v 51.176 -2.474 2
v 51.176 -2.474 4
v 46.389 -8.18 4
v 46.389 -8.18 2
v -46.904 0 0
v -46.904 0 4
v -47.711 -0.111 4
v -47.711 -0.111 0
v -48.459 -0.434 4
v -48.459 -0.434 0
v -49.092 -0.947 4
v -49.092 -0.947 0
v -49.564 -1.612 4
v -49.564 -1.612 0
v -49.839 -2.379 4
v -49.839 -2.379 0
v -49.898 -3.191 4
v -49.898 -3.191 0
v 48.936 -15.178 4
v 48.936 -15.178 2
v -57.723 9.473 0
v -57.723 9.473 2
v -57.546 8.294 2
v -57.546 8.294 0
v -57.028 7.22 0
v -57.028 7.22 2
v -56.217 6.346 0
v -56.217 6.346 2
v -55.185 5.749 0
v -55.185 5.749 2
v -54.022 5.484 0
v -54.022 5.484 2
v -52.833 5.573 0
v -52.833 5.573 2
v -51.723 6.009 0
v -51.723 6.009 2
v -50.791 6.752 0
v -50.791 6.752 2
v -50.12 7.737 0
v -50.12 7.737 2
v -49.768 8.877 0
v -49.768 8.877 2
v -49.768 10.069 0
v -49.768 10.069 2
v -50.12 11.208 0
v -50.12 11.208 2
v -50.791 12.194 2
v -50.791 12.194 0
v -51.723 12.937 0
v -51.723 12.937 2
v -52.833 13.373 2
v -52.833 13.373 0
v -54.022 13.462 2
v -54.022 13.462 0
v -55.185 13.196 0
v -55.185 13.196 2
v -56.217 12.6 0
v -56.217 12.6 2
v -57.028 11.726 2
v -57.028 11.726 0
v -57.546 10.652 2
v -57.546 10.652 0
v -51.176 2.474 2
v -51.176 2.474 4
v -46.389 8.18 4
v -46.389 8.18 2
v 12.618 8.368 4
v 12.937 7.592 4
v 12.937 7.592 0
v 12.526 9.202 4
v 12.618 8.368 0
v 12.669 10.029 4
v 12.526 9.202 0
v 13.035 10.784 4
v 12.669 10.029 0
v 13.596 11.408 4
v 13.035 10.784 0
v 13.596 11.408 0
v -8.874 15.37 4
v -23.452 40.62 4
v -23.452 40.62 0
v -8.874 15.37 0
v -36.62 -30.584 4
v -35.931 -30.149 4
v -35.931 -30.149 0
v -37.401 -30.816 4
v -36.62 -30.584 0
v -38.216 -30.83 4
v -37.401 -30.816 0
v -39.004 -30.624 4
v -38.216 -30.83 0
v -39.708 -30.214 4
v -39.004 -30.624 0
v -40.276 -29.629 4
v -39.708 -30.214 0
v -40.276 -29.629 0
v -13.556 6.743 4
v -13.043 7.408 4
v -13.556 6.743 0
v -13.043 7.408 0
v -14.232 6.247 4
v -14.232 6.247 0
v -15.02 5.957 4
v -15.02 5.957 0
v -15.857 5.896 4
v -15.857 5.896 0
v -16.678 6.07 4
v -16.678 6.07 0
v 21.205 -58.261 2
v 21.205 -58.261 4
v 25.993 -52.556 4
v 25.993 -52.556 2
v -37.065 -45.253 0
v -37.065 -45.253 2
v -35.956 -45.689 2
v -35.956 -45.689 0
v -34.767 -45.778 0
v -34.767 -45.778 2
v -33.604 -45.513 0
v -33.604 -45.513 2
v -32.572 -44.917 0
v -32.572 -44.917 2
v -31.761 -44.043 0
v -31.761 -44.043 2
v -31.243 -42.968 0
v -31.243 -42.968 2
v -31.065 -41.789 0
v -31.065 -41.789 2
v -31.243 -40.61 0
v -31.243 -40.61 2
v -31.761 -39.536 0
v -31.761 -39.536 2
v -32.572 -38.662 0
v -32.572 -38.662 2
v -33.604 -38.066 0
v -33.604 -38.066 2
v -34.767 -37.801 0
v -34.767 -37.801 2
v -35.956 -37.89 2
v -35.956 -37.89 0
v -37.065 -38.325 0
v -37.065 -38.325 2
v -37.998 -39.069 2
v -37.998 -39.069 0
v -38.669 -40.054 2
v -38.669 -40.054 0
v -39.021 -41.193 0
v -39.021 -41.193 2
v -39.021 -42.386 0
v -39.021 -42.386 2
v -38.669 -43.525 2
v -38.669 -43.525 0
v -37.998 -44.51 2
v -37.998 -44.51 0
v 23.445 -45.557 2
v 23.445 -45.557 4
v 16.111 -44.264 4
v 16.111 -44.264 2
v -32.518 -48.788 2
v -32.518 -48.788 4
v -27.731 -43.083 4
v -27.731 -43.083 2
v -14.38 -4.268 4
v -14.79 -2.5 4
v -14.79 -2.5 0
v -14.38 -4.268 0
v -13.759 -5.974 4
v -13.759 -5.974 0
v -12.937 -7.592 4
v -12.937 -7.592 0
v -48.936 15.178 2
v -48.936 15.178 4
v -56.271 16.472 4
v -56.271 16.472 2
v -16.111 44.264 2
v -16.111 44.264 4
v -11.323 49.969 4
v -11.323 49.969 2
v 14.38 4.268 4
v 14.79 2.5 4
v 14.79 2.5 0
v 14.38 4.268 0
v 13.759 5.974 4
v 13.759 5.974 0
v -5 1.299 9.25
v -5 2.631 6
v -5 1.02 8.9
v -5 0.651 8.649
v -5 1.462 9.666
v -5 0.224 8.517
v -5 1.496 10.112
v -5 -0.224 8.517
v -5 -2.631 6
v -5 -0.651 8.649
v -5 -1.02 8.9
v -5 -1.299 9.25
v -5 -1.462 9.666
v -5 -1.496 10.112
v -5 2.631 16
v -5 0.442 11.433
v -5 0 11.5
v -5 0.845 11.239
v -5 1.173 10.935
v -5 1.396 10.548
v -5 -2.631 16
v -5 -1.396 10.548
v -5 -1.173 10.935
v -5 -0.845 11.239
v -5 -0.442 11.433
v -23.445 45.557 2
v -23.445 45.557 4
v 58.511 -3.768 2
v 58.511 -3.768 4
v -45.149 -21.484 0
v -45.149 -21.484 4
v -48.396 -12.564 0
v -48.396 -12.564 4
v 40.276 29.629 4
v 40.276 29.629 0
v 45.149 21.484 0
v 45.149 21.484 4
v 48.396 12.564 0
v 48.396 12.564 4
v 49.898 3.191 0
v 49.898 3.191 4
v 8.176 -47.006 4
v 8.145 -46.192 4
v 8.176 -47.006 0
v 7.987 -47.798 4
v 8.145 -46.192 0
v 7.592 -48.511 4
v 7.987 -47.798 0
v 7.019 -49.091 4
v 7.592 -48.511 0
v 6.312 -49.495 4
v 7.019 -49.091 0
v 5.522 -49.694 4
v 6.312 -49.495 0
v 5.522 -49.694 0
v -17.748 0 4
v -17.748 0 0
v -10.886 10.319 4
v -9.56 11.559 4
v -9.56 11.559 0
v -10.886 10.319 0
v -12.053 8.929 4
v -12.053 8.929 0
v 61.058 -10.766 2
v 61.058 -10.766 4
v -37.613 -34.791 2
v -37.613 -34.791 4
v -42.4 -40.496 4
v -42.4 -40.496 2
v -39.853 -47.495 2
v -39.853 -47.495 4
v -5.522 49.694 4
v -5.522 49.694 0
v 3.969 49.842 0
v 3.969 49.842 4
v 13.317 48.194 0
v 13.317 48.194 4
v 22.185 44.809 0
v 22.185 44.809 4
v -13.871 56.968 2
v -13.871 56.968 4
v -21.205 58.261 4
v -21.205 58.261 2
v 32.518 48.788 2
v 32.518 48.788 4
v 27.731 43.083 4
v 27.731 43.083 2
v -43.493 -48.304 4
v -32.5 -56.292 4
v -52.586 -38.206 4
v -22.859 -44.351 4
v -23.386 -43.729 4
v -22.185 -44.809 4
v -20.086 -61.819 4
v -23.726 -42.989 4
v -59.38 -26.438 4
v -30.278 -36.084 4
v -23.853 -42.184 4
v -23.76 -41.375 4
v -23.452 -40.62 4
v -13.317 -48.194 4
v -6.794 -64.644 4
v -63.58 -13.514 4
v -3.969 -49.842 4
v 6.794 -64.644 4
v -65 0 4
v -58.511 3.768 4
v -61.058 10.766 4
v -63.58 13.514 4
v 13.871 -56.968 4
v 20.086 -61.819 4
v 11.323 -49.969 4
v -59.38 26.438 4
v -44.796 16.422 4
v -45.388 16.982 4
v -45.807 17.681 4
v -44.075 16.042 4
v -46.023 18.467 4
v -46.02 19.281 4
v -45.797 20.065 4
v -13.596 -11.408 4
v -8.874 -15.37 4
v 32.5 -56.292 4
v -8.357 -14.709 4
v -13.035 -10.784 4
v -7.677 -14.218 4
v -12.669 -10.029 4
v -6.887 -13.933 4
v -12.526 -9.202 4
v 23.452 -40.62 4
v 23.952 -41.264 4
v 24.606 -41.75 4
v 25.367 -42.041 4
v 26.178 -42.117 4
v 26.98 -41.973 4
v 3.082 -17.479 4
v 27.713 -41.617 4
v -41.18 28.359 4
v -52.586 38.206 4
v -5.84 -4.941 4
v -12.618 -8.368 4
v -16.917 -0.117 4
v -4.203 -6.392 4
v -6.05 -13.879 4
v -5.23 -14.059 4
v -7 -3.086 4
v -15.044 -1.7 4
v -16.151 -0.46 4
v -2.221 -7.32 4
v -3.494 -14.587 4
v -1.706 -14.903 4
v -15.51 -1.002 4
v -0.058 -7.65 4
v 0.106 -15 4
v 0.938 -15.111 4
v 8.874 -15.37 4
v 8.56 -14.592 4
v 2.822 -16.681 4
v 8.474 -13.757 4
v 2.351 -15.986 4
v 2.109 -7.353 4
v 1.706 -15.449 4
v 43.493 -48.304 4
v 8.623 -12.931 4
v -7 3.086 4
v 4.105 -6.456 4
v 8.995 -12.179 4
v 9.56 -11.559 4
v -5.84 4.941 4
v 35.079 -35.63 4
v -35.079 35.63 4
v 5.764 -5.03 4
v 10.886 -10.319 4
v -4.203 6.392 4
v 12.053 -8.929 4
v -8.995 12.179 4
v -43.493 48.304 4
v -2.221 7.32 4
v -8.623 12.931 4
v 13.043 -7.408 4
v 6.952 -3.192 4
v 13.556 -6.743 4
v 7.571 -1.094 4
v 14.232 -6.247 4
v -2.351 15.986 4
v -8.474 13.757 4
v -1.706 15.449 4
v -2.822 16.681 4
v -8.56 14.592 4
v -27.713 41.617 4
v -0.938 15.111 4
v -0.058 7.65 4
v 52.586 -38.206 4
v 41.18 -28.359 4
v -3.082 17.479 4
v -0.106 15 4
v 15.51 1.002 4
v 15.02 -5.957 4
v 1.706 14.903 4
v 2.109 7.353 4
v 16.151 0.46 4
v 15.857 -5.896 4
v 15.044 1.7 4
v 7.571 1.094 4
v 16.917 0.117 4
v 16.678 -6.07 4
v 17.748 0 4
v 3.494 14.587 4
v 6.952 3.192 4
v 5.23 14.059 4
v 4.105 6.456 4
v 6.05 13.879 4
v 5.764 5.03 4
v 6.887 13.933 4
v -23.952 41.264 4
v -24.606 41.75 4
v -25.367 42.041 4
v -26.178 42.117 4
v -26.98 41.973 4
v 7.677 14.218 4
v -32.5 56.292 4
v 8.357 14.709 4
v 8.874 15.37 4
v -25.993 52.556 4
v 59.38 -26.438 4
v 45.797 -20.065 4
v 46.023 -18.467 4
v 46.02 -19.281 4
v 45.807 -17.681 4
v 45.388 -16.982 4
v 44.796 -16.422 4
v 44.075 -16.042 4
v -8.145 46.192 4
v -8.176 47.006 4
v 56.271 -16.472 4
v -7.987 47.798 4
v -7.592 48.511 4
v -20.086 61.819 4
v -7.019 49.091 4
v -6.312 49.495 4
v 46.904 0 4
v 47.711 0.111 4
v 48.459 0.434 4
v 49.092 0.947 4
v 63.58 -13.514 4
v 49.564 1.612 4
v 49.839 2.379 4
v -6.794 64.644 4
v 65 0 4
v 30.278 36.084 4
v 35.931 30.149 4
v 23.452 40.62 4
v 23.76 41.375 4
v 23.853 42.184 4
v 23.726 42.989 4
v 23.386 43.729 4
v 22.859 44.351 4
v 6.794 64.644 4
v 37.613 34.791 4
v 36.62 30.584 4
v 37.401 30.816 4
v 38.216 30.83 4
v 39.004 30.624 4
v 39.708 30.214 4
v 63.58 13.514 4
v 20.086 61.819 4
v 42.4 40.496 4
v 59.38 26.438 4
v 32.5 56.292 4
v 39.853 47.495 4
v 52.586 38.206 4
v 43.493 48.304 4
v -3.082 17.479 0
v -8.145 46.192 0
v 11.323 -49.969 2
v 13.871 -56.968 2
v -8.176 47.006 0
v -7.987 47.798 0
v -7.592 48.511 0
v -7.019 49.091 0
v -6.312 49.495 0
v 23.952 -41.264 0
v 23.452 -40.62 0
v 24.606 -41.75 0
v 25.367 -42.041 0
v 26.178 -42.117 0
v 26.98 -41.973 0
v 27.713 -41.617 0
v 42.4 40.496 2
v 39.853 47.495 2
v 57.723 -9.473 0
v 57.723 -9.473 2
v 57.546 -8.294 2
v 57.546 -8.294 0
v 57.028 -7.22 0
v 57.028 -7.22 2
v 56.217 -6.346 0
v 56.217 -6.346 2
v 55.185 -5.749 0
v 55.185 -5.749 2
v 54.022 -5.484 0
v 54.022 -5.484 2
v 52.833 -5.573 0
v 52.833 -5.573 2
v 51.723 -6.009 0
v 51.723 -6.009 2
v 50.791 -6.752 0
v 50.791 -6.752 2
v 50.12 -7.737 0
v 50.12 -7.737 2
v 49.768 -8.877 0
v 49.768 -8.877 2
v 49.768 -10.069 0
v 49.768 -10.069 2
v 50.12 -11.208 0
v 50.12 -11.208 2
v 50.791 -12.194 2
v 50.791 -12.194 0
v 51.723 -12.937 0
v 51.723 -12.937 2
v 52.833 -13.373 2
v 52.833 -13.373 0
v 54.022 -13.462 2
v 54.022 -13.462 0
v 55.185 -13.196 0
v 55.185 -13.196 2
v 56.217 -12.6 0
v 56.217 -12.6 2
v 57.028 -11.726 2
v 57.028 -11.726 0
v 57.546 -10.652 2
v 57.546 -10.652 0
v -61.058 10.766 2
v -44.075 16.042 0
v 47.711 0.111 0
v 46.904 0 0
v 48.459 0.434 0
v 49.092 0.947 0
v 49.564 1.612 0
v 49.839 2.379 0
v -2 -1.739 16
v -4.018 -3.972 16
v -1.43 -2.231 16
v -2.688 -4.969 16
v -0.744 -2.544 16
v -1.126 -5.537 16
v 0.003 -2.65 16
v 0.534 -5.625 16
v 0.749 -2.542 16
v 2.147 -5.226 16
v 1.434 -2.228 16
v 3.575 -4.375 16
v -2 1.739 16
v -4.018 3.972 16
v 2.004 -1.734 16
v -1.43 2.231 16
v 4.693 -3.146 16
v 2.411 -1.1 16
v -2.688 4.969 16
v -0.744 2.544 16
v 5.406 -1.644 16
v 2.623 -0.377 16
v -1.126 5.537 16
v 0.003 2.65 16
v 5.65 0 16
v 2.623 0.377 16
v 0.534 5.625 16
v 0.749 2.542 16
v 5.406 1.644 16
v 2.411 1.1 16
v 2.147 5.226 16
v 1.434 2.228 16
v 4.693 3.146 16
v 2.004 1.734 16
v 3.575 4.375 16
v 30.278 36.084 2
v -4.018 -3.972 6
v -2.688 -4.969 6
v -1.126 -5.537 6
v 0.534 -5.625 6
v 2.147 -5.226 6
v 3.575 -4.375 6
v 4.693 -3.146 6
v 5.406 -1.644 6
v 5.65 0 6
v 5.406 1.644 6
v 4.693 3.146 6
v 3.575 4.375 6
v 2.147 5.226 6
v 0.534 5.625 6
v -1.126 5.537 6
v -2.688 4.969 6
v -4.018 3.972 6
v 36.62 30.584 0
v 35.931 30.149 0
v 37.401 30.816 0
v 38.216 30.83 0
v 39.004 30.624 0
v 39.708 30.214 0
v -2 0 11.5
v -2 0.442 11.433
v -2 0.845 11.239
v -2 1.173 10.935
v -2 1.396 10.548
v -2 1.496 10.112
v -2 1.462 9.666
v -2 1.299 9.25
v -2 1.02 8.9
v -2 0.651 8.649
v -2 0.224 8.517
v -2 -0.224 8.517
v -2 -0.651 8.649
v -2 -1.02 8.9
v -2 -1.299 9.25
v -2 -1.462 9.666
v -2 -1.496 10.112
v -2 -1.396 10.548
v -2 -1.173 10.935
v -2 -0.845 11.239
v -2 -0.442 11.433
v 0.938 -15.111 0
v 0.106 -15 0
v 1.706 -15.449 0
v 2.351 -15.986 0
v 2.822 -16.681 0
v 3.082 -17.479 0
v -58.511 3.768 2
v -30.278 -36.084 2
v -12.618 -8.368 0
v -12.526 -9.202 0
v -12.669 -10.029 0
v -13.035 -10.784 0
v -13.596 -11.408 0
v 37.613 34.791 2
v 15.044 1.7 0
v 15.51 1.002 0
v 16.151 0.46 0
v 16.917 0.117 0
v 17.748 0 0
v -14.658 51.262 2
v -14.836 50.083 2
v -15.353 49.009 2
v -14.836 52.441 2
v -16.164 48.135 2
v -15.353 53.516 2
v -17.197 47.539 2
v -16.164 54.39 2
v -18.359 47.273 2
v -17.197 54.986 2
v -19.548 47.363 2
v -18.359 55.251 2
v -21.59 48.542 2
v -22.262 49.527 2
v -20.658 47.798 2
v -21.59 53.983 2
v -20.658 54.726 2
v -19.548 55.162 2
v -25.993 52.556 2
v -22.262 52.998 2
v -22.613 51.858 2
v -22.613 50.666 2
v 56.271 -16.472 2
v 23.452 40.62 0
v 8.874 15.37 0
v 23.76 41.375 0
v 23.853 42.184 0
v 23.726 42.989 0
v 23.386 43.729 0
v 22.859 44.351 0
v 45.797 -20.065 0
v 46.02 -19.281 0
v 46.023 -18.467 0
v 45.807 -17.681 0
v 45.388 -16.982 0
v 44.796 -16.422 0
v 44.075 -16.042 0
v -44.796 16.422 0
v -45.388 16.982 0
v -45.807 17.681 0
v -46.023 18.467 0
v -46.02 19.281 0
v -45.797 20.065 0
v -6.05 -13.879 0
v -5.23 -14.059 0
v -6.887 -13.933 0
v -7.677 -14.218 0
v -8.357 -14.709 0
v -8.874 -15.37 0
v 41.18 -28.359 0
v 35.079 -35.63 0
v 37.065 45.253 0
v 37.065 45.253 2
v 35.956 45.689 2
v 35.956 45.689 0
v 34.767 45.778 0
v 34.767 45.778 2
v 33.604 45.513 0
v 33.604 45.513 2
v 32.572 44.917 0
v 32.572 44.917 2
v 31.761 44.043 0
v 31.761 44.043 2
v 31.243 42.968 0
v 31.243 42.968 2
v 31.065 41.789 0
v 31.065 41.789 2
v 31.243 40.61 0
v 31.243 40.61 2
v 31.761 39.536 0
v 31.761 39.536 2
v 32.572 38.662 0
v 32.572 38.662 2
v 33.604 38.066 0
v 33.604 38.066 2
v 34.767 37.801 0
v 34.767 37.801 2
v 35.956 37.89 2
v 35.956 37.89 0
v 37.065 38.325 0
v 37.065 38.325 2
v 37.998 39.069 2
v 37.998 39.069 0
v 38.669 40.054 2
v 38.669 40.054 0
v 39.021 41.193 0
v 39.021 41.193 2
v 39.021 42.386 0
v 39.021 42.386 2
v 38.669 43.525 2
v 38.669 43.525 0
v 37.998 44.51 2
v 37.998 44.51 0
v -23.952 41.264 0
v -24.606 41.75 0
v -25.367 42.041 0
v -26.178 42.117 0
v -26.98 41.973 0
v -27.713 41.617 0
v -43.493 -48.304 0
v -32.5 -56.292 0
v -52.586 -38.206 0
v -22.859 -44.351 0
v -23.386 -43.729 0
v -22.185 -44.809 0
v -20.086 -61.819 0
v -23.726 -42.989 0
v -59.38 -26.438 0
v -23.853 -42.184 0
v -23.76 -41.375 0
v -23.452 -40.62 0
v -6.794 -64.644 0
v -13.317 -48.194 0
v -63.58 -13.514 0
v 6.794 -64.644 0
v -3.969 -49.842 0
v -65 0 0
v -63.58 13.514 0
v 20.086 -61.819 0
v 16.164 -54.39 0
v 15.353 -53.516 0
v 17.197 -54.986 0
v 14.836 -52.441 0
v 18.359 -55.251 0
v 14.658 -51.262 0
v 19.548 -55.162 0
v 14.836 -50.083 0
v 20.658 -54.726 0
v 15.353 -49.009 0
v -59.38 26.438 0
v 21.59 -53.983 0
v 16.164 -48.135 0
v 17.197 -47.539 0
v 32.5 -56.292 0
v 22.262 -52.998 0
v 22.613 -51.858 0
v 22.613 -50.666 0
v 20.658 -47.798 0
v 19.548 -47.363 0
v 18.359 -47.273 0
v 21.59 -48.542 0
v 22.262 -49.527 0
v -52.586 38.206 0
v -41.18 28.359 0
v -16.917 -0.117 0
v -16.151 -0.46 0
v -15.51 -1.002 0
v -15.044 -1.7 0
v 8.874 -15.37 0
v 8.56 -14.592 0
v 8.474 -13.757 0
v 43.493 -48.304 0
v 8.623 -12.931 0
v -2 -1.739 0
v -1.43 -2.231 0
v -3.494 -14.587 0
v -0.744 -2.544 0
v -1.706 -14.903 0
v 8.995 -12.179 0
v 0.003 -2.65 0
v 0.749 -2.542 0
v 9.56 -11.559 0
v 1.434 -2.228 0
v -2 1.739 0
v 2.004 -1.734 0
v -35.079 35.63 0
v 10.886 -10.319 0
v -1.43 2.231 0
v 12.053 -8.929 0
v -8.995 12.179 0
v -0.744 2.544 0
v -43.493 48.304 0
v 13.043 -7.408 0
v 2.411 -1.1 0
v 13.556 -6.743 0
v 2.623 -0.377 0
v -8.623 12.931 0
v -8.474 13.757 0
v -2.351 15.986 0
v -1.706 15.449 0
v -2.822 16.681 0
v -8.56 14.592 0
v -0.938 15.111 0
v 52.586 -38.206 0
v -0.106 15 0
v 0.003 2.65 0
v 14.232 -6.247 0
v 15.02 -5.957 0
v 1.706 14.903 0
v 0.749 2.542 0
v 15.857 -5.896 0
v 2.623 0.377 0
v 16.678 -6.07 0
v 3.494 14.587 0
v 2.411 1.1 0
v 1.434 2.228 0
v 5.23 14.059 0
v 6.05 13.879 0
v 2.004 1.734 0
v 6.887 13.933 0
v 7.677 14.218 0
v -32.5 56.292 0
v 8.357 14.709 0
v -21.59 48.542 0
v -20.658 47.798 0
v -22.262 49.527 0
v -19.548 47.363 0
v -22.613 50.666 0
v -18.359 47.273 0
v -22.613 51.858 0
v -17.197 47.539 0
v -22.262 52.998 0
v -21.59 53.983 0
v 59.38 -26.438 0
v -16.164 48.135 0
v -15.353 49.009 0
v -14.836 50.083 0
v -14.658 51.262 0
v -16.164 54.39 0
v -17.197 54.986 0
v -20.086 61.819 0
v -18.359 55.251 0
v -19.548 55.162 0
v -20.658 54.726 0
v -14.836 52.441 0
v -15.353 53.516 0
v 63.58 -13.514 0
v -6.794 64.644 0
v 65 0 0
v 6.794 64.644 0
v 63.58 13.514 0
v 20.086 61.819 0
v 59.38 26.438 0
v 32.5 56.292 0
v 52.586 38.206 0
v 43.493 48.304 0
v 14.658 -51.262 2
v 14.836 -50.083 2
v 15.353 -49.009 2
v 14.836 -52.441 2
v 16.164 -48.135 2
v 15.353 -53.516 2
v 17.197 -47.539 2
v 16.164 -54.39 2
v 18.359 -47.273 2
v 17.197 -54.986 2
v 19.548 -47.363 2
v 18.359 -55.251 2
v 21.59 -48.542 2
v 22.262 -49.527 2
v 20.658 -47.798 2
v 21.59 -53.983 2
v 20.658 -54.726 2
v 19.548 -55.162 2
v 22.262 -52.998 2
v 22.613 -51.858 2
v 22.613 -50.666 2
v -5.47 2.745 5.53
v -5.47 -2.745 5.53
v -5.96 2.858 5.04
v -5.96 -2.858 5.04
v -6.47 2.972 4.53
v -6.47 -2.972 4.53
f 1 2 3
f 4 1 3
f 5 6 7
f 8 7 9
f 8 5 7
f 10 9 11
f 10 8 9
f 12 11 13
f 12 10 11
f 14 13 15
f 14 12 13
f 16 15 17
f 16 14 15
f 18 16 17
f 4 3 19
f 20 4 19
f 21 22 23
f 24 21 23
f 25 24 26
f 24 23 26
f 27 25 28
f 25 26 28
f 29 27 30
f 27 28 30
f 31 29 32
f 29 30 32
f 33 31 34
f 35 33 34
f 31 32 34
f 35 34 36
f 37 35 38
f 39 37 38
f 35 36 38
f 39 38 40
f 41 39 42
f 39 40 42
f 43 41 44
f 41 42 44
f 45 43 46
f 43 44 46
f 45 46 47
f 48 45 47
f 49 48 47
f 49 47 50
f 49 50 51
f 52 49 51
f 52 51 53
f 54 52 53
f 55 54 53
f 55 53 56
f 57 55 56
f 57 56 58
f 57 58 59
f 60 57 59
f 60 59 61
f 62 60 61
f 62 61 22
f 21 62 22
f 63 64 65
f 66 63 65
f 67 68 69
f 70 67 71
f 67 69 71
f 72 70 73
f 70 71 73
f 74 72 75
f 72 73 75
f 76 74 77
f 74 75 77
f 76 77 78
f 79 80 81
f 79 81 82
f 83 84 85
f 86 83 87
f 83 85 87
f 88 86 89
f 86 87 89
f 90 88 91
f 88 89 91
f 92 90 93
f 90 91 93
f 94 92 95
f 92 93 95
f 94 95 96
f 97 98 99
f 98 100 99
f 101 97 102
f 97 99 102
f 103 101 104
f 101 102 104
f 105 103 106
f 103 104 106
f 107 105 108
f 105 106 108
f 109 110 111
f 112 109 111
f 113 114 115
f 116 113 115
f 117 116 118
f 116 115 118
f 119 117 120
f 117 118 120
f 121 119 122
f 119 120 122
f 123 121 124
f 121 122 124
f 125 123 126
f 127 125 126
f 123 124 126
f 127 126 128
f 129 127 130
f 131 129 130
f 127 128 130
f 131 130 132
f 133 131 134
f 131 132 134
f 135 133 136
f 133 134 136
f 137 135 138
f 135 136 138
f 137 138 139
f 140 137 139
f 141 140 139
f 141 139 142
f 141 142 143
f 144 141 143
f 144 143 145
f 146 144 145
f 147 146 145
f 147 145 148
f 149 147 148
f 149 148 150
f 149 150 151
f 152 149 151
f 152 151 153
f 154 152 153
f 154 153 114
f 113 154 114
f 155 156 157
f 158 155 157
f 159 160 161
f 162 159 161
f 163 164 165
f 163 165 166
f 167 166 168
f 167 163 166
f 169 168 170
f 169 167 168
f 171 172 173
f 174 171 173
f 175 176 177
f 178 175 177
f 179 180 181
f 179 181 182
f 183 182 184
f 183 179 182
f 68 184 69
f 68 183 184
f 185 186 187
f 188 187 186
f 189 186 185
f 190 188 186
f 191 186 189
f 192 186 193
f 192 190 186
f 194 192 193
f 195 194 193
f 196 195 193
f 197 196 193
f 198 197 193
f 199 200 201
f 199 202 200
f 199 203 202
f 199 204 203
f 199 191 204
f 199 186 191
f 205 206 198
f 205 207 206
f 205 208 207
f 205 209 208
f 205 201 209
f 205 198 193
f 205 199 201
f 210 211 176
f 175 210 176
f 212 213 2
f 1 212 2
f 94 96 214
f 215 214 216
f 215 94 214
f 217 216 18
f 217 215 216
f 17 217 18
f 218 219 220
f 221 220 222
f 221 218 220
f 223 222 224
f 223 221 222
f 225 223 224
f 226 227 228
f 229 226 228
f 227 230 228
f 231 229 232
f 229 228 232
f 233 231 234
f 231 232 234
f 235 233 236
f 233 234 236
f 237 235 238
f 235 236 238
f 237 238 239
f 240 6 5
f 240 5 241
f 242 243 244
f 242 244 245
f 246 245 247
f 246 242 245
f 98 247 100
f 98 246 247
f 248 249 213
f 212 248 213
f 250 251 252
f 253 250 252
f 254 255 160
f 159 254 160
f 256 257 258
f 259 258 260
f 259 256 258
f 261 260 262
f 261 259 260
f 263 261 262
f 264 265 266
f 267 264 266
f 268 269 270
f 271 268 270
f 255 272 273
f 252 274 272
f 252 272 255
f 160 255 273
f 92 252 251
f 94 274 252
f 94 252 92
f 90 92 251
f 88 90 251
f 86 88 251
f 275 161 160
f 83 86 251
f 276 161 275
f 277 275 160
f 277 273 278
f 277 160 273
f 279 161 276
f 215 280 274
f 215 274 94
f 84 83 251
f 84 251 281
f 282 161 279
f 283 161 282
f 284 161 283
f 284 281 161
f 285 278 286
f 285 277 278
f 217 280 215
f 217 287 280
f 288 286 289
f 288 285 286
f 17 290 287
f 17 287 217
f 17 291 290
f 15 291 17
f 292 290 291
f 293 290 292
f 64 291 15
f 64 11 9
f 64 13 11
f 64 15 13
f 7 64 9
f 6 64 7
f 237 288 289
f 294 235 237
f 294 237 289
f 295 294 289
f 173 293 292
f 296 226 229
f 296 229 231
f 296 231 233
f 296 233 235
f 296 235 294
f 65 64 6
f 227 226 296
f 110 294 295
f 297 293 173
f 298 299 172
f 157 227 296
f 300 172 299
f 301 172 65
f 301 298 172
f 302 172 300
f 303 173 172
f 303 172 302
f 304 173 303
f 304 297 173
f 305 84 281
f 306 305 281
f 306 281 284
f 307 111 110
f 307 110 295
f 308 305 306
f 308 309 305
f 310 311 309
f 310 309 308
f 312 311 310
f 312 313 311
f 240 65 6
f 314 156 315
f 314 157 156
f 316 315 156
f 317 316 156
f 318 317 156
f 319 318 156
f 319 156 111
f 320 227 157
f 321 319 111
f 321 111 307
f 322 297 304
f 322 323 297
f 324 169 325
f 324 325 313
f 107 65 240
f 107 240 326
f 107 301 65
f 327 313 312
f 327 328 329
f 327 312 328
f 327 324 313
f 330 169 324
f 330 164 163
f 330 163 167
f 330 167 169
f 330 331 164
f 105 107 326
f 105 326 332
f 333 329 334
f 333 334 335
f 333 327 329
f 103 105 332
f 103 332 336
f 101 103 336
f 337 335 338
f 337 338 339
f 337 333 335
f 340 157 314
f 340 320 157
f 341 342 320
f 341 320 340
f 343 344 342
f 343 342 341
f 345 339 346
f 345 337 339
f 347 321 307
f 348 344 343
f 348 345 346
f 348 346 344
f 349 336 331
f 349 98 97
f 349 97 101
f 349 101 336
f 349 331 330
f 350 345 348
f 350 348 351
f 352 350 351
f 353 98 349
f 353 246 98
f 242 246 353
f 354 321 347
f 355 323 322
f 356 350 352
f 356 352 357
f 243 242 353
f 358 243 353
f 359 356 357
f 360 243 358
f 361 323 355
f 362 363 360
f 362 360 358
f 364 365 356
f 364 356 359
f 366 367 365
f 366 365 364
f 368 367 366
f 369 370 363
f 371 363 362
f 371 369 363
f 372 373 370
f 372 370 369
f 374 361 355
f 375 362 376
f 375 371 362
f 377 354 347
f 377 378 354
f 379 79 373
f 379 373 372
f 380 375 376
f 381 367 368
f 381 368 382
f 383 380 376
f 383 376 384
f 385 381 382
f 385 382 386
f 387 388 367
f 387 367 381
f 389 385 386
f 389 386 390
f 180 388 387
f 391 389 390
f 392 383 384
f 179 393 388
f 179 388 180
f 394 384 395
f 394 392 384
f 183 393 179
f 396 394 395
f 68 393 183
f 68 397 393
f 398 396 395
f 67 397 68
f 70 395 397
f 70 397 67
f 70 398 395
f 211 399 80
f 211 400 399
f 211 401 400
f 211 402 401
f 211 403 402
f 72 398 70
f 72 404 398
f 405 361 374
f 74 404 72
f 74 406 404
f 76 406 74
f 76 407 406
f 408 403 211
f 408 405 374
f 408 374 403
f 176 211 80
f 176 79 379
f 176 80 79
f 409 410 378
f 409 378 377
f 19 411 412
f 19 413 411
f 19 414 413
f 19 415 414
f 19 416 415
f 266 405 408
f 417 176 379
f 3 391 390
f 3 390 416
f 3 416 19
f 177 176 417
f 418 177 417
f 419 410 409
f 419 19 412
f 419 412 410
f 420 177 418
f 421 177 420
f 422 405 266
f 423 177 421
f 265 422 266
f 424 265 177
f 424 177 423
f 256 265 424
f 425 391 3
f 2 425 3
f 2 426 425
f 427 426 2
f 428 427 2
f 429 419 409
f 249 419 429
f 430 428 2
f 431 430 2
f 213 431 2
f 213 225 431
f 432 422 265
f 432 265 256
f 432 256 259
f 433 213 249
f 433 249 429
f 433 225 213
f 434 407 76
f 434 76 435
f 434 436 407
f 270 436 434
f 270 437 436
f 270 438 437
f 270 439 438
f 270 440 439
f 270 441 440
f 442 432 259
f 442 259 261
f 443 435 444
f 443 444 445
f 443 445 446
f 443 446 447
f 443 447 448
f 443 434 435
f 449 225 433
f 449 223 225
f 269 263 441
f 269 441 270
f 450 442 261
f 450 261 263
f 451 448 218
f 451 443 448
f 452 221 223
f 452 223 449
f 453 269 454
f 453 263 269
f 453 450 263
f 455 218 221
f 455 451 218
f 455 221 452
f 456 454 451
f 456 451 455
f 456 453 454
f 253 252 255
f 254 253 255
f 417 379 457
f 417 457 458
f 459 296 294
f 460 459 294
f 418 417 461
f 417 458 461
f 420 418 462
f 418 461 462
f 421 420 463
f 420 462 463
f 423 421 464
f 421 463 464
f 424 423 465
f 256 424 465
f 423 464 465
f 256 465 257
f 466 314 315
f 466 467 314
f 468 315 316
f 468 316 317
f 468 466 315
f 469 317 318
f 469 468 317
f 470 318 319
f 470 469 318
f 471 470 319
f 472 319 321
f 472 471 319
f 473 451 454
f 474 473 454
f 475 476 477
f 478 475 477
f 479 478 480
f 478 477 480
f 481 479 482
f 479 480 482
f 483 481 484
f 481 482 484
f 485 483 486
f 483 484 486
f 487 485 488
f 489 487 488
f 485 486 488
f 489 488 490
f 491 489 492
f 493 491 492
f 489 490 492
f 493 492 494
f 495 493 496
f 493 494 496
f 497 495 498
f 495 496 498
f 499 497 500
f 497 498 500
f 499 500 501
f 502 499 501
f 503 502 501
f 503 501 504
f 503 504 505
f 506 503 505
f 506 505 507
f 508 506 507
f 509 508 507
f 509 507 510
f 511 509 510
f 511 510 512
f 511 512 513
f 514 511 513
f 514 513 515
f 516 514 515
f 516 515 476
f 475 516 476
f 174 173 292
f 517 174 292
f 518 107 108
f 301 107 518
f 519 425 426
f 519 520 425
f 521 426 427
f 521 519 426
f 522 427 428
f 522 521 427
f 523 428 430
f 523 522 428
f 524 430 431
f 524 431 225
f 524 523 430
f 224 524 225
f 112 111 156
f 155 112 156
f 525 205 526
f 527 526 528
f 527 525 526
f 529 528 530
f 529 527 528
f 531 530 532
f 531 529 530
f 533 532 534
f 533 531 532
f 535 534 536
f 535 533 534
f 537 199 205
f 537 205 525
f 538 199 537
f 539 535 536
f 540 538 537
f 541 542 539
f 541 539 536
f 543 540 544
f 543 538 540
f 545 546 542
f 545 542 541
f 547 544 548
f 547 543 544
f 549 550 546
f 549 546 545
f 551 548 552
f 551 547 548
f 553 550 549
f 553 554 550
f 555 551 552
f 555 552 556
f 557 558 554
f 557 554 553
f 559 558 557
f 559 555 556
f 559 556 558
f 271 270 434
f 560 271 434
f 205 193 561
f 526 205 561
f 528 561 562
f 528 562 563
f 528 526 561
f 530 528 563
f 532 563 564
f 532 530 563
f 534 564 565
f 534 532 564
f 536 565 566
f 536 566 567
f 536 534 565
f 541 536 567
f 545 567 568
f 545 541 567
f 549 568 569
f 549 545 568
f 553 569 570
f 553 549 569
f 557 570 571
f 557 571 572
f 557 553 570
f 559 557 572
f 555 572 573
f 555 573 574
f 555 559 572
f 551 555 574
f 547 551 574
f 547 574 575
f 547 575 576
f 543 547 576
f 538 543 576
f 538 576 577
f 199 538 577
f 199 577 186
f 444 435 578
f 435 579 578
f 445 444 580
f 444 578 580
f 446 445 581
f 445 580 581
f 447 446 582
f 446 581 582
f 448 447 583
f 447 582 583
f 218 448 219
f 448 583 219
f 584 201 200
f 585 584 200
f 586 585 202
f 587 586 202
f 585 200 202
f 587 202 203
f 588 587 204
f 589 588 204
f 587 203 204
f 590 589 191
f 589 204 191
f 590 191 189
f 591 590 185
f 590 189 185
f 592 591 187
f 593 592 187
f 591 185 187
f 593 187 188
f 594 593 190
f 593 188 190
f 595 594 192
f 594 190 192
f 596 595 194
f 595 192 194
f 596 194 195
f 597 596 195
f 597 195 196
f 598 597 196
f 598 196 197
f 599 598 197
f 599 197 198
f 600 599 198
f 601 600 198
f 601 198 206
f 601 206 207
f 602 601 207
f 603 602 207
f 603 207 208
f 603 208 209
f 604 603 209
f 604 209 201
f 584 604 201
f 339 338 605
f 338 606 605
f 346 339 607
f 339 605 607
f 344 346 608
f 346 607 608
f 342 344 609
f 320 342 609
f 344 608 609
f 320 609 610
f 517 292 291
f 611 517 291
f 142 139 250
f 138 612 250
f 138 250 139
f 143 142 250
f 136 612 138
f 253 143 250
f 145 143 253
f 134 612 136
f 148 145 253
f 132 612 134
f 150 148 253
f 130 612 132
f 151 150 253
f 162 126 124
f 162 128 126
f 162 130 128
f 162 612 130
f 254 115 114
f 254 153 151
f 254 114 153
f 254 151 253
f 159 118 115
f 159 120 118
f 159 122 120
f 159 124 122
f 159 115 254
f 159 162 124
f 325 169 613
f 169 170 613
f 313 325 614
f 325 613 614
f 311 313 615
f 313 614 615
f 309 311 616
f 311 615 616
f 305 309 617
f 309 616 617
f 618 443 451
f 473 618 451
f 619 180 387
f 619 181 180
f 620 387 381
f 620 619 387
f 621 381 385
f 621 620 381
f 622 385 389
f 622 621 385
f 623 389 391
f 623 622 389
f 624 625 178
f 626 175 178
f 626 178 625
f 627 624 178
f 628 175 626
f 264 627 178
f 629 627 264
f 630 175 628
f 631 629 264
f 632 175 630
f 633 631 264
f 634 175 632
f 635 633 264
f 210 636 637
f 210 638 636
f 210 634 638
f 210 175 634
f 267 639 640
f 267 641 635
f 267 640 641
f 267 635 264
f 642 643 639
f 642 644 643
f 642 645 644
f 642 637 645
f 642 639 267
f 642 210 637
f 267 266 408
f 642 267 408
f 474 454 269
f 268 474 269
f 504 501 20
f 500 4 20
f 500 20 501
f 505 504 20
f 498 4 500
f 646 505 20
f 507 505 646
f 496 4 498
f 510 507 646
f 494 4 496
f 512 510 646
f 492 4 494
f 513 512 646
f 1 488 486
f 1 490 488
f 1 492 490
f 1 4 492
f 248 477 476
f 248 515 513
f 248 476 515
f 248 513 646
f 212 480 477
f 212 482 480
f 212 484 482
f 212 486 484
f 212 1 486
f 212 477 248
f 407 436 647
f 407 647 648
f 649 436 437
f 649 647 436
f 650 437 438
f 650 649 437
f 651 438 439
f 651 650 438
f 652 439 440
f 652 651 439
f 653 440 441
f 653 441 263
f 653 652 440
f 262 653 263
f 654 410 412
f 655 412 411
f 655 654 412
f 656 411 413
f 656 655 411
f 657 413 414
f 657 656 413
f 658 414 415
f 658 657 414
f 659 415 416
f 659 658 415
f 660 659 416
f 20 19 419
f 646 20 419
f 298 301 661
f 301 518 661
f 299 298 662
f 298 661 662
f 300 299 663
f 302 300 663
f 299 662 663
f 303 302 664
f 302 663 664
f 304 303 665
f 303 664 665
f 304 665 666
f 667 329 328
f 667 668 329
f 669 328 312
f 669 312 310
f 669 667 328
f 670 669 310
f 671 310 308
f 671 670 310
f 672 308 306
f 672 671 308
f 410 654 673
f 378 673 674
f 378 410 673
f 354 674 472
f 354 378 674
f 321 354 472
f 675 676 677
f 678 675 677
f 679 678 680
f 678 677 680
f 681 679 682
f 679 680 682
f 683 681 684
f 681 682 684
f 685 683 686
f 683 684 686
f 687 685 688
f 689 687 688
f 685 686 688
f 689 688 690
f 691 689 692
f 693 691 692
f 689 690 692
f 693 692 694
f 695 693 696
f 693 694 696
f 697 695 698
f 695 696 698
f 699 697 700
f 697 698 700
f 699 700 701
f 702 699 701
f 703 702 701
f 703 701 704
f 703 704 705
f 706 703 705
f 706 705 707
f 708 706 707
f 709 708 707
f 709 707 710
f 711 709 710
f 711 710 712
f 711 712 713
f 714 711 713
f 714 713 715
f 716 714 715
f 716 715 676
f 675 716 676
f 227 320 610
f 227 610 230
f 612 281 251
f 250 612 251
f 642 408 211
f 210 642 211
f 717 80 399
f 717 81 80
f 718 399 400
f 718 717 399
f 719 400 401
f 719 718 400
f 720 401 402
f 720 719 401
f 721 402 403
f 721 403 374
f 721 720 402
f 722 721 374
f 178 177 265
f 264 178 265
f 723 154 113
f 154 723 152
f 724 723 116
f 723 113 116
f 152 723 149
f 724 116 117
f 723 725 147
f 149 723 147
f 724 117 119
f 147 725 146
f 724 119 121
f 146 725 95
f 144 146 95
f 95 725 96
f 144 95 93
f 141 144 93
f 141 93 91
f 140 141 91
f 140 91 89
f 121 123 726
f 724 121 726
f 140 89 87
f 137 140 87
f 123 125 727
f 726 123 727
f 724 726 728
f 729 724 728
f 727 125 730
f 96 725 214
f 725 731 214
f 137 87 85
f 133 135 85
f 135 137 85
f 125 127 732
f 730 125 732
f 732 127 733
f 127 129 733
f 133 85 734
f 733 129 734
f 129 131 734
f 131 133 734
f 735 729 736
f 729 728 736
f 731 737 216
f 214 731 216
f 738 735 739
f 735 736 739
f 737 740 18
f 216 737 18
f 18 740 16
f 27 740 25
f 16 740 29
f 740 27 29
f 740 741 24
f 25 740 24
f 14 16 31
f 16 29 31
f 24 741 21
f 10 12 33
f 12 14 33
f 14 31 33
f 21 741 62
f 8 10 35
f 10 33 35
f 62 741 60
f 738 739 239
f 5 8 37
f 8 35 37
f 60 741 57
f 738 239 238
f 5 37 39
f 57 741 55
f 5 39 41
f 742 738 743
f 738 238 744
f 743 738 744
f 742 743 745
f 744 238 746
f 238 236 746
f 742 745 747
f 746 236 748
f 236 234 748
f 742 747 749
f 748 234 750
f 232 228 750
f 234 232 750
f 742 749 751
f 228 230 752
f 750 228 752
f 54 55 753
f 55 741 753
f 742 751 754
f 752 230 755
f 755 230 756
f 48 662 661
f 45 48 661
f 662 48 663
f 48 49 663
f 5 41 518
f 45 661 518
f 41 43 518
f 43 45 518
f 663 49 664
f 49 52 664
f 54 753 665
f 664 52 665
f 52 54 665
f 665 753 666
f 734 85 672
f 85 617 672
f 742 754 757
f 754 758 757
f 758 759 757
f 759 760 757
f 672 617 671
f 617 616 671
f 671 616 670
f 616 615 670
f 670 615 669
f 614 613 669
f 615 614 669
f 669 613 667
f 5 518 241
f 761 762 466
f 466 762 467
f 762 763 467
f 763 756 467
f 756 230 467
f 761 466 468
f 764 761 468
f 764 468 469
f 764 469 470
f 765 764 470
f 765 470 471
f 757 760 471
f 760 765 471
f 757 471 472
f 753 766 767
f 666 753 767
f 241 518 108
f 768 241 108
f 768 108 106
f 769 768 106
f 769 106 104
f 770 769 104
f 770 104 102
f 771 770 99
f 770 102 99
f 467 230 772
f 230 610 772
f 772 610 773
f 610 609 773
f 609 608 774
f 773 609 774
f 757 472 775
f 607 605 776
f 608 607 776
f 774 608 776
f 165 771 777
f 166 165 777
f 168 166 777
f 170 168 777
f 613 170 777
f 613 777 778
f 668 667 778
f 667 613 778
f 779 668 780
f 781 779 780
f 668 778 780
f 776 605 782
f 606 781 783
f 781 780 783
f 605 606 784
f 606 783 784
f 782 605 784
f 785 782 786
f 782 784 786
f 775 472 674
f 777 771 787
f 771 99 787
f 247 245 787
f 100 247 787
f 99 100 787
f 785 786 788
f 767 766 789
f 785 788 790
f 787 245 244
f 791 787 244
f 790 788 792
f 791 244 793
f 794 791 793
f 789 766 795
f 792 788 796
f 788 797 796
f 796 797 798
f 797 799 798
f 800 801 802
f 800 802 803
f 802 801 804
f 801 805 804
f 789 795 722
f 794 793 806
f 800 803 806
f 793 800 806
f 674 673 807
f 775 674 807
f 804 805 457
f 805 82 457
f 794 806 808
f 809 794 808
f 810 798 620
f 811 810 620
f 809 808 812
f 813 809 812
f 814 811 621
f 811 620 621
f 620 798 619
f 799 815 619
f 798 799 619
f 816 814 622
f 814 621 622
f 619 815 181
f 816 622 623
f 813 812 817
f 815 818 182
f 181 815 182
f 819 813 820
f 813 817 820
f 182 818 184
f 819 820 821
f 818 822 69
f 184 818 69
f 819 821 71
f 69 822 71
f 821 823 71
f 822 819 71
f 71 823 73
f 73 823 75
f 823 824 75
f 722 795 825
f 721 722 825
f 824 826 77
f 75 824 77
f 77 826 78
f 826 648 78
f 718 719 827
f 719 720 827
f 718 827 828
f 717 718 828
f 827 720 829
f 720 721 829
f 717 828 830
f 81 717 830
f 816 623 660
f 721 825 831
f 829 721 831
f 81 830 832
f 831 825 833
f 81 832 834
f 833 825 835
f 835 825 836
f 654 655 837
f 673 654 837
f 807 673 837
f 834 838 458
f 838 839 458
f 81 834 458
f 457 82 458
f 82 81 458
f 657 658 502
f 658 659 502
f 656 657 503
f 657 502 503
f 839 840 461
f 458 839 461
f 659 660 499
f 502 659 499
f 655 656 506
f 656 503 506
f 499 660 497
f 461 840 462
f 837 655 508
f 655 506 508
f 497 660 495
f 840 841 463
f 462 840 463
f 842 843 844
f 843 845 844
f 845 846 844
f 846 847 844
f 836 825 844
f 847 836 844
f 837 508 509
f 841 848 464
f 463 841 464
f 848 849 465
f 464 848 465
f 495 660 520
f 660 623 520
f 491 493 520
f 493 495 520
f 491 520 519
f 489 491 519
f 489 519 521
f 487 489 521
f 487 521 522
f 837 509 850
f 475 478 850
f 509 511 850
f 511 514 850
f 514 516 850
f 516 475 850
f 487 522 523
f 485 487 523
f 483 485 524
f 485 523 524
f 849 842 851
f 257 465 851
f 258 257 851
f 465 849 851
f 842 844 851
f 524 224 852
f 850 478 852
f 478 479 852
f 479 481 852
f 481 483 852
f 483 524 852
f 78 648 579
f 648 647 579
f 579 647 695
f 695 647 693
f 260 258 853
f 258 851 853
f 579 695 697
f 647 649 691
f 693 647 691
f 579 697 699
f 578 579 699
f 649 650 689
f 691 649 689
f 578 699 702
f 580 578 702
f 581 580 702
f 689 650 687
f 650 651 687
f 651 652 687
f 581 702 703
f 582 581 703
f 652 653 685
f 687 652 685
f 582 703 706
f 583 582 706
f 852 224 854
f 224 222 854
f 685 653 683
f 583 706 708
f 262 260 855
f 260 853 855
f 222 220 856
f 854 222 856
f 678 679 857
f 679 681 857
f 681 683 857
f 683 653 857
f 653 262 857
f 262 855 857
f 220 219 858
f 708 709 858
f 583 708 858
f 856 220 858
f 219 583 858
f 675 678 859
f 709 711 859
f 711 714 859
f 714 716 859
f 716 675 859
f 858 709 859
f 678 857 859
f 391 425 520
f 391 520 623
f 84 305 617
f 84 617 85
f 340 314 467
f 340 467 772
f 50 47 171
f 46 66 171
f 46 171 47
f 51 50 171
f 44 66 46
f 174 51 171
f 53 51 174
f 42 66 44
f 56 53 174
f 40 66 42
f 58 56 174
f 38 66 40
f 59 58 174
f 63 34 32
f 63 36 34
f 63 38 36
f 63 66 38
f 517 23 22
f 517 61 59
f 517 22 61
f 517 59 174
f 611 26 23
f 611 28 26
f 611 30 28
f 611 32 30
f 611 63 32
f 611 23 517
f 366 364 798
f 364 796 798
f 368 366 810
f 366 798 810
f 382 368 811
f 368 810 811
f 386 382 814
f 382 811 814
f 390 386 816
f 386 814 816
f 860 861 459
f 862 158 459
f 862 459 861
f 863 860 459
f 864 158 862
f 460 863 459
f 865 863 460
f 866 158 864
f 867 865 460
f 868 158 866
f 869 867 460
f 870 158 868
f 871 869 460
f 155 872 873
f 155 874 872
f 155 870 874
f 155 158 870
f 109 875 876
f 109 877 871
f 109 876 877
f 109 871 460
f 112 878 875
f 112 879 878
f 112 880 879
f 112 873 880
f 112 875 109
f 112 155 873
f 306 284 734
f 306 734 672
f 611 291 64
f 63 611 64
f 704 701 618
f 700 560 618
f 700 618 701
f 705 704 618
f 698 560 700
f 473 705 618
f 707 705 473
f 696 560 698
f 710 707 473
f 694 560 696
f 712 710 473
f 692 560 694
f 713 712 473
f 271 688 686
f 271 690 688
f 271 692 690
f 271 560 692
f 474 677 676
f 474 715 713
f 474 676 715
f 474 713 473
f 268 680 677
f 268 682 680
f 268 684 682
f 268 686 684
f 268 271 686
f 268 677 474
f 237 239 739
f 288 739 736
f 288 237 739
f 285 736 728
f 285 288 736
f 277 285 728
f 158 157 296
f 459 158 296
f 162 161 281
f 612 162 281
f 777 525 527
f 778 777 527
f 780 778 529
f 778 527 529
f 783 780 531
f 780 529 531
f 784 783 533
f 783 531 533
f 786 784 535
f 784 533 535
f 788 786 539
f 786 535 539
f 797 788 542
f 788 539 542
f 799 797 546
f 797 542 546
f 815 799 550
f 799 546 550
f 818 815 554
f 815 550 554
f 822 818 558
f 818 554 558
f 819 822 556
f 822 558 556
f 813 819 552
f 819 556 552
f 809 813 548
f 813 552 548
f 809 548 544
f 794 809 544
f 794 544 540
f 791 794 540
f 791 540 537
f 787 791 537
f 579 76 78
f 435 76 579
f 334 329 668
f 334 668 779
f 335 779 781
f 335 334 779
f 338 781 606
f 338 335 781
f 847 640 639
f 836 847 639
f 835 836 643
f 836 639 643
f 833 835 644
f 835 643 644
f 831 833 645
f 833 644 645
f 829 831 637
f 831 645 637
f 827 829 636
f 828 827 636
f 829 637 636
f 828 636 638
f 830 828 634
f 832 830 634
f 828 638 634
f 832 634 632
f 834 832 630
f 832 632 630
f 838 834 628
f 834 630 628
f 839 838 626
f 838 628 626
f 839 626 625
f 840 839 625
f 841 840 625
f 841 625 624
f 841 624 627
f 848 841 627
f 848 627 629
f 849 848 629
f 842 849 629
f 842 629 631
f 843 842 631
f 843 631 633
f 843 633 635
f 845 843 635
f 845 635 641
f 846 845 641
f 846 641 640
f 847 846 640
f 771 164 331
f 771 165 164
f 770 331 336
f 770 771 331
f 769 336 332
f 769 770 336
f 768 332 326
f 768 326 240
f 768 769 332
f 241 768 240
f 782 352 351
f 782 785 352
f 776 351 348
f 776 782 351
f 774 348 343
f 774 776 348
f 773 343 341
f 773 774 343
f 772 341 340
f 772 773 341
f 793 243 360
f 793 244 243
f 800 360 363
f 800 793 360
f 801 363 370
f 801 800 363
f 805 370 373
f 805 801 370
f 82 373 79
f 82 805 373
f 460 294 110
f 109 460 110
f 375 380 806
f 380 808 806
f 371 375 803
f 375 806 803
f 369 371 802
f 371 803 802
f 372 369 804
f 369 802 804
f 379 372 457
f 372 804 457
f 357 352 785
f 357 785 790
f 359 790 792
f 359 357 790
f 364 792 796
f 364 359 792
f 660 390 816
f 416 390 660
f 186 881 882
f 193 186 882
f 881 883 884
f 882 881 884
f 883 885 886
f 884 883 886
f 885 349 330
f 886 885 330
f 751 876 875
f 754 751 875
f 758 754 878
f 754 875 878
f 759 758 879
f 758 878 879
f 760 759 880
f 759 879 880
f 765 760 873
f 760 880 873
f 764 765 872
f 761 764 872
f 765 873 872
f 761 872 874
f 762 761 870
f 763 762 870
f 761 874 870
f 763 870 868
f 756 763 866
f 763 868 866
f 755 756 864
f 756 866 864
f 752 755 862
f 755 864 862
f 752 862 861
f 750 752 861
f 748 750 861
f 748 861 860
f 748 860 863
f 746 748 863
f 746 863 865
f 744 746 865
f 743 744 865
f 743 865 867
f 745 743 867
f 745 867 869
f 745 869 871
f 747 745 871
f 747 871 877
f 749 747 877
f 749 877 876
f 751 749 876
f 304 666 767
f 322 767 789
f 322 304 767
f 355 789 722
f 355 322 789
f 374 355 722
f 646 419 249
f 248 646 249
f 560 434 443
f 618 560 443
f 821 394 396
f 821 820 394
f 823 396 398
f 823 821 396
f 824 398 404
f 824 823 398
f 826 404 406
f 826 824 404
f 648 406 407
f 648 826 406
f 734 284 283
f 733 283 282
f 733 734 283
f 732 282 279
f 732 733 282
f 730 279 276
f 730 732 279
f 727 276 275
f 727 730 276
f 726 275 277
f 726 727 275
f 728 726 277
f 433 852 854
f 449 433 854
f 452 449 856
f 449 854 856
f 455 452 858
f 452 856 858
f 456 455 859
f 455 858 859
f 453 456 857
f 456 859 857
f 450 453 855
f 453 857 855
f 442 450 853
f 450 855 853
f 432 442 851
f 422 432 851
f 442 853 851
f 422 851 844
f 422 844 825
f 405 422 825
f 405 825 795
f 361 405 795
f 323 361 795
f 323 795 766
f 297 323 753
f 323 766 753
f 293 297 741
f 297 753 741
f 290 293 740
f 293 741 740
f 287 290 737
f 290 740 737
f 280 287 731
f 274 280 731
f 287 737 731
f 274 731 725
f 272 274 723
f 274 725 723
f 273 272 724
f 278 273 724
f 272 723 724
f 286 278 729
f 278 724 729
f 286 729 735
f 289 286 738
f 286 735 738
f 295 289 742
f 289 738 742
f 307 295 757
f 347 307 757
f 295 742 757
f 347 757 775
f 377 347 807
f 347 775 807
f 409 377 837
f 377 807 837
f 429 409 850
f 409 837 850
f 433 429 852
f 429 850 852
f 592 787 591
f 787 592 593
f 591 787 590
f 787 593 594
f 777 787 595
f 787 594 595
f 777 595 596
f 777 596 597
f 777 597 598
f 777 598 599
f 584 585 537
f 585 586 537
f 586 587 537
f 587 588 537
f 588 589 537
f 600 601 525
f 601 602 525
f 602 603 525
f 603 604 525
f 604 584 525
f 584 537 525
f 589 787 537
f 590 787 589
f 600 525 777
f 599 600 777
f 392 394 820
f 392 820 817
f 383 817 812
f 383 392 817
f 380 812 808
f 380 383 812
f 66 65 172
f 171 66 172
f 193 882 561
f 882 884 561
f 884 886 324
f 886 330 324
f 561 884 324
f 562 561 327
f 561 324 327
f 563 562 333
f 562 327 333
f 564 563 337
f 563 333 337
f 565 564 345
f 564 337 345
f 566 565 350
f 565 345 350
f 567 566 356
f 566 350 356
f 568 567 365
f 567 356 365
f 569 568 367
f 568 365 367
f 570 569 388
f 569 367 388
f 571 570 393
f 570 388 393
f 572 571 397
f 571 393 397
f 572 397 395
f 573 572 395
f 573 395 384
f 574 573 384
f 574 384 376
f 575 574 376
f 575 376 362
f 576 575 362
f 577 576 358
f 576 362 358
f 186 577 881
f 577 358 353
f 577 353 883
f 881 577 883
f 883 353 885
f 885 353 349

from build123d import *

# Parameters (mm, degrees)
ESQUISSE1_R                        = 65
BOSS_EXTRU_1_DEPTH                 = 4
ENL_V_MAT_EXTRU_1_DEPTH            = 93.010868923
BOSS_EXTRU_2_START                 = 12
BOSS_EXTRU_2_DEPTH                 = 12
ENL_V_MAT_EXTRU_2_REACH            = 98.856
ESQUISSE4_R                        = 1.5
CHANFREIN1_SIZE                    = 2
ENL_V_MAT_EXTRU_3_REACH            = 94.704
CONG_1_R                           = 3
ENL_V_MAT_EXTRU_4_DEPTH            = 2
ENL_V_MAT_EXTRU_5_REACH            = 94.984
ESQUISSE8_R                        = 4
R_P_TITION_CIRCULAIRE1_COUNT       = 6
CONG_1_OF_R_P_TITION_CIRCULAIRE1_R = 3


with BuildPart() as part:
    # Esquisse1 → Boss.-Extru.1 (new body)
    with BuildSketch(Plane.XY):
        Circle(ESQUISSE1_R)
    extrude(amount=BOSS_EXTRU_1_DEPTH)

    # Esquisse2 → Enlèv. mat.-Extru.1 (cut, through all)
    with BuildSketch(Plane.XY.offset(4)):
        with BuildLine():
            Line((-2, 1.738533865), (-2, -1.738533865))
            ThreePointArc((-2, -1.738533865), (2.65, 0), (-2, 1.738533865))
        make_face()
    extrude(amount=-ENL_V_MAT_EXTRU_1_DEPTH, mode=Mode.SUBTRACT)

    # Esquisse3 → Boss.-Extru.2 (add)
    with BuildSketch(Plane.XY.offset(4).offset(BOSS_EXTRU_2_START)):
        with BuildLine():
            Line((-5, 2.631064423), (-5, -2.631064423))
            ThreePointArc((-5, -2.631064423), (5.65, 0), (-5, 2.631064423))
        make_face()
        with BuildLine():
            Line((-2, 1.738533865), (-2, -1.738533865))
            ThreePointArc((-2, -1.738533865), (2.65, 0), (-2, 1.738533865))
        make_face(mode=Mode.SUBTRACT)
    extrude(amount=-BOSS_EXTRU_2_DEPTH)

    # Esquisse4 → Enlèv. mat.-Extru.2 (cut, up to next)
    with BuildSketch(Plane.ZY.offset(5), mode=Mode.PRIVATE) as enl_v_mat_extru_2_sk1:
        with Locations((10, 0)):
            Circle(ESQUISSE4_R)
    enl_v_mat_extru_2_tool1 = extrude(enl_v_mat_extru_2_sk1.sketch, amount=-ENL_V_MAT_EXTRU_2_REACH, mode=Mode.PRIVATE) & part.part
    add(enl_v_mat_extru_2_tool1.solids().sort_by_distance((-5, 0, 10))[0], mode=Mode.SUBTRACT)

    # Chanfrein1
    chanfrein1_edges = [part.edges().sort_by_distance(p)[0] for p in [
        (-5, 0, 4),
        (5.65, 0, 4),
    ]]
    chamfer(chanfrein1_edges, length=CHANFREIN1_SIZE)

    # Esquisse5 → Enlèv. mat.-Extru.3 (cut, up to next)
    with BuildSketch(Plane.XY.offset(4), mode=Mode.PRIVATE) as enl_v_mat_extru_3_sk1:
        with BuildLine():
            Line((14.095389312, -5.13030215), (46.984631039, -17.101007166))
            ThreePointArc((46.984631039, -17.101007166), (38.302222156, -32.139380484), (25, -43.301270189))
            Line((25, -43.301270189), (7.5, -12.990381057))
            ThreePointArc((7.5, -12.990381057), (11.490666647, -9.641814145), (14.095389312, -5.13030215))
        make_face()
    enl_v_mat_extru_3_tool1 = extrude(enl_v_mat_extru_3_sk1.sketch, amount=-ENL_V_MAT_EXTRU_3_REACH, mode=Mode.PRIVATE) & part.part
    enl_v_mat_extru_3 = enl_v_mat_extru_3_tool1.solids().sort_by_distance((26.751521, -22.447191, 4))[0]
    add(enl_v_mat_extru_3, mode=Mode.SUBTRACT)

    # Congé1
    cong_1_edges = [part.edges().sort_by_distance(p)[0] for p in [
        (25, -43.301270189, 2),
        (46.984631039, -17.101007166, 2),
        (7.5, -12.990381057, 2),
        (14.095389312, -5.13030215, 2),
    ]]
    fillet(cong_1_edges, radius=CONG_1_R)

    # Esquisse7 → Enlèv. mat.-Extru.4 (cut)
    with BuildSketch(Plane.XY.offset(4)):
        Polygon((61.058080687, -10.766187015), (58.510776745, -3.767526956), (51.176107371, -2.47422685), (46.388741937, -8.179586805), (48.936045879, -15.178246864), (56.270715253, -16.47154697), align=None)
    enl_v_mat_extru_4 = extrude(amount=-ENL_V_MAT_EXTRU_4_DEPTH, mode=Mode.SUBTRACT)

    # Esquisse8 → Enlèv. mat.-Extru.5 (cut, up to next)
    with BuildSketch(Plane.XY.offset(2), mode=Mode.PRIVATE) as enl_v_mat_extru_5_sk1:
        with Locations((53.723411312, -9.47288691)):
            Circle(ESQUISSE8_R)
    enl_v_mat_extru_5_tool1 = extrude(enl_v_mat_extru_5_sk1.sketch, amount=-ENL_V_MAT_EXTRU_5_REACH, mode=Mode.PRIVATE) & part.part
    enl_v_mat_extru_5 = enl_v_mat_extru_5_tool1.solids().sort_by_distance((53.723411, -9.472887, 2))[0]
    add(enl_v_mat_extru_5, mode=Mode.SUBTRACT)

    # Répétition circulaire1: Enlèv. mat.-Extru.3, Enlèv. mat.-Extru.4, Enlèv. mat.-Extru.5 ×6 about axis
    r_p_tition_circulaire1_axis = Axis((0, 0, -0.8), (0, 0, 1))
    add([enl_v_mat_extru_3.rotate(r_p_tition_circulaire1_axis, i * 360 / R_P_TITION_CIRCULAIRE1_COUNT) for i in range(1, R_P_TITION_CIRCULAIRE1_COUNT)], mode=Mode.SUBTRACT)
    add([enl_v_mat_extru_4.rotate(r_p_tition_circulaire1_axis, i * 360 / R_P_TITION_CIRCULAIRE1_COUNT) for i in range(1, R_P_TITION_CIRCULAIRE1_COUNT)], mode=Mode.SUBTRACT)
    add([enl_v_mat_extru_5.rotate(r_p_tition_circulaire1_axis, i * 360 / R_P_TITION_CIRCULAIRE1_COUNT) for i in range(1, R_P_TITION_CIRCULAIRE1_COUNT)], mode=Mode.SUBTRACT)

    # Congé1 of Répétition circulaire1
    cong_1_of_r_p_tition_circulaire1_edges = [part.edges().sort_by_distance(p)[0] for p in [
        (50, 0, 2),
        (38.302222156, 32.139380484, 2),
        (15, 0, 2),
        (11.490666647, 9.641814145, 2),
        (25, 43.301270189, 2),
        (-8.682408883, 49.240387651, 2),
        (7.5, 12.990381057, 2),
        (-2.604722665, 14.772116295, 2),
        (-25, 43.301270189, 2),
        (-46.984631039, 17.101007166, 2),
        (-7.5, 12.990381057, 2),
        (-14.095389312, 5.13030215, 2),
        (-50, 0, 2),
        (-38.302222156, -32.139380484, 2),
        (-15, 0, 2),
        (-11.490666647, -9.641814145, 2),
        (-25, -43.301270189, 2),
        (8.682408883, -49.240387651, 2),
        (-7.5, -12.990381057, 2),
        (2.604722665, -14.772116295, 2),
    ]]
    fillet(cong_1_of_r_p_tition_circulaire1_edges, radius=CONG_1_OF_R_P_TITION_CIRCULAIRE1_R)


solid = part.part
